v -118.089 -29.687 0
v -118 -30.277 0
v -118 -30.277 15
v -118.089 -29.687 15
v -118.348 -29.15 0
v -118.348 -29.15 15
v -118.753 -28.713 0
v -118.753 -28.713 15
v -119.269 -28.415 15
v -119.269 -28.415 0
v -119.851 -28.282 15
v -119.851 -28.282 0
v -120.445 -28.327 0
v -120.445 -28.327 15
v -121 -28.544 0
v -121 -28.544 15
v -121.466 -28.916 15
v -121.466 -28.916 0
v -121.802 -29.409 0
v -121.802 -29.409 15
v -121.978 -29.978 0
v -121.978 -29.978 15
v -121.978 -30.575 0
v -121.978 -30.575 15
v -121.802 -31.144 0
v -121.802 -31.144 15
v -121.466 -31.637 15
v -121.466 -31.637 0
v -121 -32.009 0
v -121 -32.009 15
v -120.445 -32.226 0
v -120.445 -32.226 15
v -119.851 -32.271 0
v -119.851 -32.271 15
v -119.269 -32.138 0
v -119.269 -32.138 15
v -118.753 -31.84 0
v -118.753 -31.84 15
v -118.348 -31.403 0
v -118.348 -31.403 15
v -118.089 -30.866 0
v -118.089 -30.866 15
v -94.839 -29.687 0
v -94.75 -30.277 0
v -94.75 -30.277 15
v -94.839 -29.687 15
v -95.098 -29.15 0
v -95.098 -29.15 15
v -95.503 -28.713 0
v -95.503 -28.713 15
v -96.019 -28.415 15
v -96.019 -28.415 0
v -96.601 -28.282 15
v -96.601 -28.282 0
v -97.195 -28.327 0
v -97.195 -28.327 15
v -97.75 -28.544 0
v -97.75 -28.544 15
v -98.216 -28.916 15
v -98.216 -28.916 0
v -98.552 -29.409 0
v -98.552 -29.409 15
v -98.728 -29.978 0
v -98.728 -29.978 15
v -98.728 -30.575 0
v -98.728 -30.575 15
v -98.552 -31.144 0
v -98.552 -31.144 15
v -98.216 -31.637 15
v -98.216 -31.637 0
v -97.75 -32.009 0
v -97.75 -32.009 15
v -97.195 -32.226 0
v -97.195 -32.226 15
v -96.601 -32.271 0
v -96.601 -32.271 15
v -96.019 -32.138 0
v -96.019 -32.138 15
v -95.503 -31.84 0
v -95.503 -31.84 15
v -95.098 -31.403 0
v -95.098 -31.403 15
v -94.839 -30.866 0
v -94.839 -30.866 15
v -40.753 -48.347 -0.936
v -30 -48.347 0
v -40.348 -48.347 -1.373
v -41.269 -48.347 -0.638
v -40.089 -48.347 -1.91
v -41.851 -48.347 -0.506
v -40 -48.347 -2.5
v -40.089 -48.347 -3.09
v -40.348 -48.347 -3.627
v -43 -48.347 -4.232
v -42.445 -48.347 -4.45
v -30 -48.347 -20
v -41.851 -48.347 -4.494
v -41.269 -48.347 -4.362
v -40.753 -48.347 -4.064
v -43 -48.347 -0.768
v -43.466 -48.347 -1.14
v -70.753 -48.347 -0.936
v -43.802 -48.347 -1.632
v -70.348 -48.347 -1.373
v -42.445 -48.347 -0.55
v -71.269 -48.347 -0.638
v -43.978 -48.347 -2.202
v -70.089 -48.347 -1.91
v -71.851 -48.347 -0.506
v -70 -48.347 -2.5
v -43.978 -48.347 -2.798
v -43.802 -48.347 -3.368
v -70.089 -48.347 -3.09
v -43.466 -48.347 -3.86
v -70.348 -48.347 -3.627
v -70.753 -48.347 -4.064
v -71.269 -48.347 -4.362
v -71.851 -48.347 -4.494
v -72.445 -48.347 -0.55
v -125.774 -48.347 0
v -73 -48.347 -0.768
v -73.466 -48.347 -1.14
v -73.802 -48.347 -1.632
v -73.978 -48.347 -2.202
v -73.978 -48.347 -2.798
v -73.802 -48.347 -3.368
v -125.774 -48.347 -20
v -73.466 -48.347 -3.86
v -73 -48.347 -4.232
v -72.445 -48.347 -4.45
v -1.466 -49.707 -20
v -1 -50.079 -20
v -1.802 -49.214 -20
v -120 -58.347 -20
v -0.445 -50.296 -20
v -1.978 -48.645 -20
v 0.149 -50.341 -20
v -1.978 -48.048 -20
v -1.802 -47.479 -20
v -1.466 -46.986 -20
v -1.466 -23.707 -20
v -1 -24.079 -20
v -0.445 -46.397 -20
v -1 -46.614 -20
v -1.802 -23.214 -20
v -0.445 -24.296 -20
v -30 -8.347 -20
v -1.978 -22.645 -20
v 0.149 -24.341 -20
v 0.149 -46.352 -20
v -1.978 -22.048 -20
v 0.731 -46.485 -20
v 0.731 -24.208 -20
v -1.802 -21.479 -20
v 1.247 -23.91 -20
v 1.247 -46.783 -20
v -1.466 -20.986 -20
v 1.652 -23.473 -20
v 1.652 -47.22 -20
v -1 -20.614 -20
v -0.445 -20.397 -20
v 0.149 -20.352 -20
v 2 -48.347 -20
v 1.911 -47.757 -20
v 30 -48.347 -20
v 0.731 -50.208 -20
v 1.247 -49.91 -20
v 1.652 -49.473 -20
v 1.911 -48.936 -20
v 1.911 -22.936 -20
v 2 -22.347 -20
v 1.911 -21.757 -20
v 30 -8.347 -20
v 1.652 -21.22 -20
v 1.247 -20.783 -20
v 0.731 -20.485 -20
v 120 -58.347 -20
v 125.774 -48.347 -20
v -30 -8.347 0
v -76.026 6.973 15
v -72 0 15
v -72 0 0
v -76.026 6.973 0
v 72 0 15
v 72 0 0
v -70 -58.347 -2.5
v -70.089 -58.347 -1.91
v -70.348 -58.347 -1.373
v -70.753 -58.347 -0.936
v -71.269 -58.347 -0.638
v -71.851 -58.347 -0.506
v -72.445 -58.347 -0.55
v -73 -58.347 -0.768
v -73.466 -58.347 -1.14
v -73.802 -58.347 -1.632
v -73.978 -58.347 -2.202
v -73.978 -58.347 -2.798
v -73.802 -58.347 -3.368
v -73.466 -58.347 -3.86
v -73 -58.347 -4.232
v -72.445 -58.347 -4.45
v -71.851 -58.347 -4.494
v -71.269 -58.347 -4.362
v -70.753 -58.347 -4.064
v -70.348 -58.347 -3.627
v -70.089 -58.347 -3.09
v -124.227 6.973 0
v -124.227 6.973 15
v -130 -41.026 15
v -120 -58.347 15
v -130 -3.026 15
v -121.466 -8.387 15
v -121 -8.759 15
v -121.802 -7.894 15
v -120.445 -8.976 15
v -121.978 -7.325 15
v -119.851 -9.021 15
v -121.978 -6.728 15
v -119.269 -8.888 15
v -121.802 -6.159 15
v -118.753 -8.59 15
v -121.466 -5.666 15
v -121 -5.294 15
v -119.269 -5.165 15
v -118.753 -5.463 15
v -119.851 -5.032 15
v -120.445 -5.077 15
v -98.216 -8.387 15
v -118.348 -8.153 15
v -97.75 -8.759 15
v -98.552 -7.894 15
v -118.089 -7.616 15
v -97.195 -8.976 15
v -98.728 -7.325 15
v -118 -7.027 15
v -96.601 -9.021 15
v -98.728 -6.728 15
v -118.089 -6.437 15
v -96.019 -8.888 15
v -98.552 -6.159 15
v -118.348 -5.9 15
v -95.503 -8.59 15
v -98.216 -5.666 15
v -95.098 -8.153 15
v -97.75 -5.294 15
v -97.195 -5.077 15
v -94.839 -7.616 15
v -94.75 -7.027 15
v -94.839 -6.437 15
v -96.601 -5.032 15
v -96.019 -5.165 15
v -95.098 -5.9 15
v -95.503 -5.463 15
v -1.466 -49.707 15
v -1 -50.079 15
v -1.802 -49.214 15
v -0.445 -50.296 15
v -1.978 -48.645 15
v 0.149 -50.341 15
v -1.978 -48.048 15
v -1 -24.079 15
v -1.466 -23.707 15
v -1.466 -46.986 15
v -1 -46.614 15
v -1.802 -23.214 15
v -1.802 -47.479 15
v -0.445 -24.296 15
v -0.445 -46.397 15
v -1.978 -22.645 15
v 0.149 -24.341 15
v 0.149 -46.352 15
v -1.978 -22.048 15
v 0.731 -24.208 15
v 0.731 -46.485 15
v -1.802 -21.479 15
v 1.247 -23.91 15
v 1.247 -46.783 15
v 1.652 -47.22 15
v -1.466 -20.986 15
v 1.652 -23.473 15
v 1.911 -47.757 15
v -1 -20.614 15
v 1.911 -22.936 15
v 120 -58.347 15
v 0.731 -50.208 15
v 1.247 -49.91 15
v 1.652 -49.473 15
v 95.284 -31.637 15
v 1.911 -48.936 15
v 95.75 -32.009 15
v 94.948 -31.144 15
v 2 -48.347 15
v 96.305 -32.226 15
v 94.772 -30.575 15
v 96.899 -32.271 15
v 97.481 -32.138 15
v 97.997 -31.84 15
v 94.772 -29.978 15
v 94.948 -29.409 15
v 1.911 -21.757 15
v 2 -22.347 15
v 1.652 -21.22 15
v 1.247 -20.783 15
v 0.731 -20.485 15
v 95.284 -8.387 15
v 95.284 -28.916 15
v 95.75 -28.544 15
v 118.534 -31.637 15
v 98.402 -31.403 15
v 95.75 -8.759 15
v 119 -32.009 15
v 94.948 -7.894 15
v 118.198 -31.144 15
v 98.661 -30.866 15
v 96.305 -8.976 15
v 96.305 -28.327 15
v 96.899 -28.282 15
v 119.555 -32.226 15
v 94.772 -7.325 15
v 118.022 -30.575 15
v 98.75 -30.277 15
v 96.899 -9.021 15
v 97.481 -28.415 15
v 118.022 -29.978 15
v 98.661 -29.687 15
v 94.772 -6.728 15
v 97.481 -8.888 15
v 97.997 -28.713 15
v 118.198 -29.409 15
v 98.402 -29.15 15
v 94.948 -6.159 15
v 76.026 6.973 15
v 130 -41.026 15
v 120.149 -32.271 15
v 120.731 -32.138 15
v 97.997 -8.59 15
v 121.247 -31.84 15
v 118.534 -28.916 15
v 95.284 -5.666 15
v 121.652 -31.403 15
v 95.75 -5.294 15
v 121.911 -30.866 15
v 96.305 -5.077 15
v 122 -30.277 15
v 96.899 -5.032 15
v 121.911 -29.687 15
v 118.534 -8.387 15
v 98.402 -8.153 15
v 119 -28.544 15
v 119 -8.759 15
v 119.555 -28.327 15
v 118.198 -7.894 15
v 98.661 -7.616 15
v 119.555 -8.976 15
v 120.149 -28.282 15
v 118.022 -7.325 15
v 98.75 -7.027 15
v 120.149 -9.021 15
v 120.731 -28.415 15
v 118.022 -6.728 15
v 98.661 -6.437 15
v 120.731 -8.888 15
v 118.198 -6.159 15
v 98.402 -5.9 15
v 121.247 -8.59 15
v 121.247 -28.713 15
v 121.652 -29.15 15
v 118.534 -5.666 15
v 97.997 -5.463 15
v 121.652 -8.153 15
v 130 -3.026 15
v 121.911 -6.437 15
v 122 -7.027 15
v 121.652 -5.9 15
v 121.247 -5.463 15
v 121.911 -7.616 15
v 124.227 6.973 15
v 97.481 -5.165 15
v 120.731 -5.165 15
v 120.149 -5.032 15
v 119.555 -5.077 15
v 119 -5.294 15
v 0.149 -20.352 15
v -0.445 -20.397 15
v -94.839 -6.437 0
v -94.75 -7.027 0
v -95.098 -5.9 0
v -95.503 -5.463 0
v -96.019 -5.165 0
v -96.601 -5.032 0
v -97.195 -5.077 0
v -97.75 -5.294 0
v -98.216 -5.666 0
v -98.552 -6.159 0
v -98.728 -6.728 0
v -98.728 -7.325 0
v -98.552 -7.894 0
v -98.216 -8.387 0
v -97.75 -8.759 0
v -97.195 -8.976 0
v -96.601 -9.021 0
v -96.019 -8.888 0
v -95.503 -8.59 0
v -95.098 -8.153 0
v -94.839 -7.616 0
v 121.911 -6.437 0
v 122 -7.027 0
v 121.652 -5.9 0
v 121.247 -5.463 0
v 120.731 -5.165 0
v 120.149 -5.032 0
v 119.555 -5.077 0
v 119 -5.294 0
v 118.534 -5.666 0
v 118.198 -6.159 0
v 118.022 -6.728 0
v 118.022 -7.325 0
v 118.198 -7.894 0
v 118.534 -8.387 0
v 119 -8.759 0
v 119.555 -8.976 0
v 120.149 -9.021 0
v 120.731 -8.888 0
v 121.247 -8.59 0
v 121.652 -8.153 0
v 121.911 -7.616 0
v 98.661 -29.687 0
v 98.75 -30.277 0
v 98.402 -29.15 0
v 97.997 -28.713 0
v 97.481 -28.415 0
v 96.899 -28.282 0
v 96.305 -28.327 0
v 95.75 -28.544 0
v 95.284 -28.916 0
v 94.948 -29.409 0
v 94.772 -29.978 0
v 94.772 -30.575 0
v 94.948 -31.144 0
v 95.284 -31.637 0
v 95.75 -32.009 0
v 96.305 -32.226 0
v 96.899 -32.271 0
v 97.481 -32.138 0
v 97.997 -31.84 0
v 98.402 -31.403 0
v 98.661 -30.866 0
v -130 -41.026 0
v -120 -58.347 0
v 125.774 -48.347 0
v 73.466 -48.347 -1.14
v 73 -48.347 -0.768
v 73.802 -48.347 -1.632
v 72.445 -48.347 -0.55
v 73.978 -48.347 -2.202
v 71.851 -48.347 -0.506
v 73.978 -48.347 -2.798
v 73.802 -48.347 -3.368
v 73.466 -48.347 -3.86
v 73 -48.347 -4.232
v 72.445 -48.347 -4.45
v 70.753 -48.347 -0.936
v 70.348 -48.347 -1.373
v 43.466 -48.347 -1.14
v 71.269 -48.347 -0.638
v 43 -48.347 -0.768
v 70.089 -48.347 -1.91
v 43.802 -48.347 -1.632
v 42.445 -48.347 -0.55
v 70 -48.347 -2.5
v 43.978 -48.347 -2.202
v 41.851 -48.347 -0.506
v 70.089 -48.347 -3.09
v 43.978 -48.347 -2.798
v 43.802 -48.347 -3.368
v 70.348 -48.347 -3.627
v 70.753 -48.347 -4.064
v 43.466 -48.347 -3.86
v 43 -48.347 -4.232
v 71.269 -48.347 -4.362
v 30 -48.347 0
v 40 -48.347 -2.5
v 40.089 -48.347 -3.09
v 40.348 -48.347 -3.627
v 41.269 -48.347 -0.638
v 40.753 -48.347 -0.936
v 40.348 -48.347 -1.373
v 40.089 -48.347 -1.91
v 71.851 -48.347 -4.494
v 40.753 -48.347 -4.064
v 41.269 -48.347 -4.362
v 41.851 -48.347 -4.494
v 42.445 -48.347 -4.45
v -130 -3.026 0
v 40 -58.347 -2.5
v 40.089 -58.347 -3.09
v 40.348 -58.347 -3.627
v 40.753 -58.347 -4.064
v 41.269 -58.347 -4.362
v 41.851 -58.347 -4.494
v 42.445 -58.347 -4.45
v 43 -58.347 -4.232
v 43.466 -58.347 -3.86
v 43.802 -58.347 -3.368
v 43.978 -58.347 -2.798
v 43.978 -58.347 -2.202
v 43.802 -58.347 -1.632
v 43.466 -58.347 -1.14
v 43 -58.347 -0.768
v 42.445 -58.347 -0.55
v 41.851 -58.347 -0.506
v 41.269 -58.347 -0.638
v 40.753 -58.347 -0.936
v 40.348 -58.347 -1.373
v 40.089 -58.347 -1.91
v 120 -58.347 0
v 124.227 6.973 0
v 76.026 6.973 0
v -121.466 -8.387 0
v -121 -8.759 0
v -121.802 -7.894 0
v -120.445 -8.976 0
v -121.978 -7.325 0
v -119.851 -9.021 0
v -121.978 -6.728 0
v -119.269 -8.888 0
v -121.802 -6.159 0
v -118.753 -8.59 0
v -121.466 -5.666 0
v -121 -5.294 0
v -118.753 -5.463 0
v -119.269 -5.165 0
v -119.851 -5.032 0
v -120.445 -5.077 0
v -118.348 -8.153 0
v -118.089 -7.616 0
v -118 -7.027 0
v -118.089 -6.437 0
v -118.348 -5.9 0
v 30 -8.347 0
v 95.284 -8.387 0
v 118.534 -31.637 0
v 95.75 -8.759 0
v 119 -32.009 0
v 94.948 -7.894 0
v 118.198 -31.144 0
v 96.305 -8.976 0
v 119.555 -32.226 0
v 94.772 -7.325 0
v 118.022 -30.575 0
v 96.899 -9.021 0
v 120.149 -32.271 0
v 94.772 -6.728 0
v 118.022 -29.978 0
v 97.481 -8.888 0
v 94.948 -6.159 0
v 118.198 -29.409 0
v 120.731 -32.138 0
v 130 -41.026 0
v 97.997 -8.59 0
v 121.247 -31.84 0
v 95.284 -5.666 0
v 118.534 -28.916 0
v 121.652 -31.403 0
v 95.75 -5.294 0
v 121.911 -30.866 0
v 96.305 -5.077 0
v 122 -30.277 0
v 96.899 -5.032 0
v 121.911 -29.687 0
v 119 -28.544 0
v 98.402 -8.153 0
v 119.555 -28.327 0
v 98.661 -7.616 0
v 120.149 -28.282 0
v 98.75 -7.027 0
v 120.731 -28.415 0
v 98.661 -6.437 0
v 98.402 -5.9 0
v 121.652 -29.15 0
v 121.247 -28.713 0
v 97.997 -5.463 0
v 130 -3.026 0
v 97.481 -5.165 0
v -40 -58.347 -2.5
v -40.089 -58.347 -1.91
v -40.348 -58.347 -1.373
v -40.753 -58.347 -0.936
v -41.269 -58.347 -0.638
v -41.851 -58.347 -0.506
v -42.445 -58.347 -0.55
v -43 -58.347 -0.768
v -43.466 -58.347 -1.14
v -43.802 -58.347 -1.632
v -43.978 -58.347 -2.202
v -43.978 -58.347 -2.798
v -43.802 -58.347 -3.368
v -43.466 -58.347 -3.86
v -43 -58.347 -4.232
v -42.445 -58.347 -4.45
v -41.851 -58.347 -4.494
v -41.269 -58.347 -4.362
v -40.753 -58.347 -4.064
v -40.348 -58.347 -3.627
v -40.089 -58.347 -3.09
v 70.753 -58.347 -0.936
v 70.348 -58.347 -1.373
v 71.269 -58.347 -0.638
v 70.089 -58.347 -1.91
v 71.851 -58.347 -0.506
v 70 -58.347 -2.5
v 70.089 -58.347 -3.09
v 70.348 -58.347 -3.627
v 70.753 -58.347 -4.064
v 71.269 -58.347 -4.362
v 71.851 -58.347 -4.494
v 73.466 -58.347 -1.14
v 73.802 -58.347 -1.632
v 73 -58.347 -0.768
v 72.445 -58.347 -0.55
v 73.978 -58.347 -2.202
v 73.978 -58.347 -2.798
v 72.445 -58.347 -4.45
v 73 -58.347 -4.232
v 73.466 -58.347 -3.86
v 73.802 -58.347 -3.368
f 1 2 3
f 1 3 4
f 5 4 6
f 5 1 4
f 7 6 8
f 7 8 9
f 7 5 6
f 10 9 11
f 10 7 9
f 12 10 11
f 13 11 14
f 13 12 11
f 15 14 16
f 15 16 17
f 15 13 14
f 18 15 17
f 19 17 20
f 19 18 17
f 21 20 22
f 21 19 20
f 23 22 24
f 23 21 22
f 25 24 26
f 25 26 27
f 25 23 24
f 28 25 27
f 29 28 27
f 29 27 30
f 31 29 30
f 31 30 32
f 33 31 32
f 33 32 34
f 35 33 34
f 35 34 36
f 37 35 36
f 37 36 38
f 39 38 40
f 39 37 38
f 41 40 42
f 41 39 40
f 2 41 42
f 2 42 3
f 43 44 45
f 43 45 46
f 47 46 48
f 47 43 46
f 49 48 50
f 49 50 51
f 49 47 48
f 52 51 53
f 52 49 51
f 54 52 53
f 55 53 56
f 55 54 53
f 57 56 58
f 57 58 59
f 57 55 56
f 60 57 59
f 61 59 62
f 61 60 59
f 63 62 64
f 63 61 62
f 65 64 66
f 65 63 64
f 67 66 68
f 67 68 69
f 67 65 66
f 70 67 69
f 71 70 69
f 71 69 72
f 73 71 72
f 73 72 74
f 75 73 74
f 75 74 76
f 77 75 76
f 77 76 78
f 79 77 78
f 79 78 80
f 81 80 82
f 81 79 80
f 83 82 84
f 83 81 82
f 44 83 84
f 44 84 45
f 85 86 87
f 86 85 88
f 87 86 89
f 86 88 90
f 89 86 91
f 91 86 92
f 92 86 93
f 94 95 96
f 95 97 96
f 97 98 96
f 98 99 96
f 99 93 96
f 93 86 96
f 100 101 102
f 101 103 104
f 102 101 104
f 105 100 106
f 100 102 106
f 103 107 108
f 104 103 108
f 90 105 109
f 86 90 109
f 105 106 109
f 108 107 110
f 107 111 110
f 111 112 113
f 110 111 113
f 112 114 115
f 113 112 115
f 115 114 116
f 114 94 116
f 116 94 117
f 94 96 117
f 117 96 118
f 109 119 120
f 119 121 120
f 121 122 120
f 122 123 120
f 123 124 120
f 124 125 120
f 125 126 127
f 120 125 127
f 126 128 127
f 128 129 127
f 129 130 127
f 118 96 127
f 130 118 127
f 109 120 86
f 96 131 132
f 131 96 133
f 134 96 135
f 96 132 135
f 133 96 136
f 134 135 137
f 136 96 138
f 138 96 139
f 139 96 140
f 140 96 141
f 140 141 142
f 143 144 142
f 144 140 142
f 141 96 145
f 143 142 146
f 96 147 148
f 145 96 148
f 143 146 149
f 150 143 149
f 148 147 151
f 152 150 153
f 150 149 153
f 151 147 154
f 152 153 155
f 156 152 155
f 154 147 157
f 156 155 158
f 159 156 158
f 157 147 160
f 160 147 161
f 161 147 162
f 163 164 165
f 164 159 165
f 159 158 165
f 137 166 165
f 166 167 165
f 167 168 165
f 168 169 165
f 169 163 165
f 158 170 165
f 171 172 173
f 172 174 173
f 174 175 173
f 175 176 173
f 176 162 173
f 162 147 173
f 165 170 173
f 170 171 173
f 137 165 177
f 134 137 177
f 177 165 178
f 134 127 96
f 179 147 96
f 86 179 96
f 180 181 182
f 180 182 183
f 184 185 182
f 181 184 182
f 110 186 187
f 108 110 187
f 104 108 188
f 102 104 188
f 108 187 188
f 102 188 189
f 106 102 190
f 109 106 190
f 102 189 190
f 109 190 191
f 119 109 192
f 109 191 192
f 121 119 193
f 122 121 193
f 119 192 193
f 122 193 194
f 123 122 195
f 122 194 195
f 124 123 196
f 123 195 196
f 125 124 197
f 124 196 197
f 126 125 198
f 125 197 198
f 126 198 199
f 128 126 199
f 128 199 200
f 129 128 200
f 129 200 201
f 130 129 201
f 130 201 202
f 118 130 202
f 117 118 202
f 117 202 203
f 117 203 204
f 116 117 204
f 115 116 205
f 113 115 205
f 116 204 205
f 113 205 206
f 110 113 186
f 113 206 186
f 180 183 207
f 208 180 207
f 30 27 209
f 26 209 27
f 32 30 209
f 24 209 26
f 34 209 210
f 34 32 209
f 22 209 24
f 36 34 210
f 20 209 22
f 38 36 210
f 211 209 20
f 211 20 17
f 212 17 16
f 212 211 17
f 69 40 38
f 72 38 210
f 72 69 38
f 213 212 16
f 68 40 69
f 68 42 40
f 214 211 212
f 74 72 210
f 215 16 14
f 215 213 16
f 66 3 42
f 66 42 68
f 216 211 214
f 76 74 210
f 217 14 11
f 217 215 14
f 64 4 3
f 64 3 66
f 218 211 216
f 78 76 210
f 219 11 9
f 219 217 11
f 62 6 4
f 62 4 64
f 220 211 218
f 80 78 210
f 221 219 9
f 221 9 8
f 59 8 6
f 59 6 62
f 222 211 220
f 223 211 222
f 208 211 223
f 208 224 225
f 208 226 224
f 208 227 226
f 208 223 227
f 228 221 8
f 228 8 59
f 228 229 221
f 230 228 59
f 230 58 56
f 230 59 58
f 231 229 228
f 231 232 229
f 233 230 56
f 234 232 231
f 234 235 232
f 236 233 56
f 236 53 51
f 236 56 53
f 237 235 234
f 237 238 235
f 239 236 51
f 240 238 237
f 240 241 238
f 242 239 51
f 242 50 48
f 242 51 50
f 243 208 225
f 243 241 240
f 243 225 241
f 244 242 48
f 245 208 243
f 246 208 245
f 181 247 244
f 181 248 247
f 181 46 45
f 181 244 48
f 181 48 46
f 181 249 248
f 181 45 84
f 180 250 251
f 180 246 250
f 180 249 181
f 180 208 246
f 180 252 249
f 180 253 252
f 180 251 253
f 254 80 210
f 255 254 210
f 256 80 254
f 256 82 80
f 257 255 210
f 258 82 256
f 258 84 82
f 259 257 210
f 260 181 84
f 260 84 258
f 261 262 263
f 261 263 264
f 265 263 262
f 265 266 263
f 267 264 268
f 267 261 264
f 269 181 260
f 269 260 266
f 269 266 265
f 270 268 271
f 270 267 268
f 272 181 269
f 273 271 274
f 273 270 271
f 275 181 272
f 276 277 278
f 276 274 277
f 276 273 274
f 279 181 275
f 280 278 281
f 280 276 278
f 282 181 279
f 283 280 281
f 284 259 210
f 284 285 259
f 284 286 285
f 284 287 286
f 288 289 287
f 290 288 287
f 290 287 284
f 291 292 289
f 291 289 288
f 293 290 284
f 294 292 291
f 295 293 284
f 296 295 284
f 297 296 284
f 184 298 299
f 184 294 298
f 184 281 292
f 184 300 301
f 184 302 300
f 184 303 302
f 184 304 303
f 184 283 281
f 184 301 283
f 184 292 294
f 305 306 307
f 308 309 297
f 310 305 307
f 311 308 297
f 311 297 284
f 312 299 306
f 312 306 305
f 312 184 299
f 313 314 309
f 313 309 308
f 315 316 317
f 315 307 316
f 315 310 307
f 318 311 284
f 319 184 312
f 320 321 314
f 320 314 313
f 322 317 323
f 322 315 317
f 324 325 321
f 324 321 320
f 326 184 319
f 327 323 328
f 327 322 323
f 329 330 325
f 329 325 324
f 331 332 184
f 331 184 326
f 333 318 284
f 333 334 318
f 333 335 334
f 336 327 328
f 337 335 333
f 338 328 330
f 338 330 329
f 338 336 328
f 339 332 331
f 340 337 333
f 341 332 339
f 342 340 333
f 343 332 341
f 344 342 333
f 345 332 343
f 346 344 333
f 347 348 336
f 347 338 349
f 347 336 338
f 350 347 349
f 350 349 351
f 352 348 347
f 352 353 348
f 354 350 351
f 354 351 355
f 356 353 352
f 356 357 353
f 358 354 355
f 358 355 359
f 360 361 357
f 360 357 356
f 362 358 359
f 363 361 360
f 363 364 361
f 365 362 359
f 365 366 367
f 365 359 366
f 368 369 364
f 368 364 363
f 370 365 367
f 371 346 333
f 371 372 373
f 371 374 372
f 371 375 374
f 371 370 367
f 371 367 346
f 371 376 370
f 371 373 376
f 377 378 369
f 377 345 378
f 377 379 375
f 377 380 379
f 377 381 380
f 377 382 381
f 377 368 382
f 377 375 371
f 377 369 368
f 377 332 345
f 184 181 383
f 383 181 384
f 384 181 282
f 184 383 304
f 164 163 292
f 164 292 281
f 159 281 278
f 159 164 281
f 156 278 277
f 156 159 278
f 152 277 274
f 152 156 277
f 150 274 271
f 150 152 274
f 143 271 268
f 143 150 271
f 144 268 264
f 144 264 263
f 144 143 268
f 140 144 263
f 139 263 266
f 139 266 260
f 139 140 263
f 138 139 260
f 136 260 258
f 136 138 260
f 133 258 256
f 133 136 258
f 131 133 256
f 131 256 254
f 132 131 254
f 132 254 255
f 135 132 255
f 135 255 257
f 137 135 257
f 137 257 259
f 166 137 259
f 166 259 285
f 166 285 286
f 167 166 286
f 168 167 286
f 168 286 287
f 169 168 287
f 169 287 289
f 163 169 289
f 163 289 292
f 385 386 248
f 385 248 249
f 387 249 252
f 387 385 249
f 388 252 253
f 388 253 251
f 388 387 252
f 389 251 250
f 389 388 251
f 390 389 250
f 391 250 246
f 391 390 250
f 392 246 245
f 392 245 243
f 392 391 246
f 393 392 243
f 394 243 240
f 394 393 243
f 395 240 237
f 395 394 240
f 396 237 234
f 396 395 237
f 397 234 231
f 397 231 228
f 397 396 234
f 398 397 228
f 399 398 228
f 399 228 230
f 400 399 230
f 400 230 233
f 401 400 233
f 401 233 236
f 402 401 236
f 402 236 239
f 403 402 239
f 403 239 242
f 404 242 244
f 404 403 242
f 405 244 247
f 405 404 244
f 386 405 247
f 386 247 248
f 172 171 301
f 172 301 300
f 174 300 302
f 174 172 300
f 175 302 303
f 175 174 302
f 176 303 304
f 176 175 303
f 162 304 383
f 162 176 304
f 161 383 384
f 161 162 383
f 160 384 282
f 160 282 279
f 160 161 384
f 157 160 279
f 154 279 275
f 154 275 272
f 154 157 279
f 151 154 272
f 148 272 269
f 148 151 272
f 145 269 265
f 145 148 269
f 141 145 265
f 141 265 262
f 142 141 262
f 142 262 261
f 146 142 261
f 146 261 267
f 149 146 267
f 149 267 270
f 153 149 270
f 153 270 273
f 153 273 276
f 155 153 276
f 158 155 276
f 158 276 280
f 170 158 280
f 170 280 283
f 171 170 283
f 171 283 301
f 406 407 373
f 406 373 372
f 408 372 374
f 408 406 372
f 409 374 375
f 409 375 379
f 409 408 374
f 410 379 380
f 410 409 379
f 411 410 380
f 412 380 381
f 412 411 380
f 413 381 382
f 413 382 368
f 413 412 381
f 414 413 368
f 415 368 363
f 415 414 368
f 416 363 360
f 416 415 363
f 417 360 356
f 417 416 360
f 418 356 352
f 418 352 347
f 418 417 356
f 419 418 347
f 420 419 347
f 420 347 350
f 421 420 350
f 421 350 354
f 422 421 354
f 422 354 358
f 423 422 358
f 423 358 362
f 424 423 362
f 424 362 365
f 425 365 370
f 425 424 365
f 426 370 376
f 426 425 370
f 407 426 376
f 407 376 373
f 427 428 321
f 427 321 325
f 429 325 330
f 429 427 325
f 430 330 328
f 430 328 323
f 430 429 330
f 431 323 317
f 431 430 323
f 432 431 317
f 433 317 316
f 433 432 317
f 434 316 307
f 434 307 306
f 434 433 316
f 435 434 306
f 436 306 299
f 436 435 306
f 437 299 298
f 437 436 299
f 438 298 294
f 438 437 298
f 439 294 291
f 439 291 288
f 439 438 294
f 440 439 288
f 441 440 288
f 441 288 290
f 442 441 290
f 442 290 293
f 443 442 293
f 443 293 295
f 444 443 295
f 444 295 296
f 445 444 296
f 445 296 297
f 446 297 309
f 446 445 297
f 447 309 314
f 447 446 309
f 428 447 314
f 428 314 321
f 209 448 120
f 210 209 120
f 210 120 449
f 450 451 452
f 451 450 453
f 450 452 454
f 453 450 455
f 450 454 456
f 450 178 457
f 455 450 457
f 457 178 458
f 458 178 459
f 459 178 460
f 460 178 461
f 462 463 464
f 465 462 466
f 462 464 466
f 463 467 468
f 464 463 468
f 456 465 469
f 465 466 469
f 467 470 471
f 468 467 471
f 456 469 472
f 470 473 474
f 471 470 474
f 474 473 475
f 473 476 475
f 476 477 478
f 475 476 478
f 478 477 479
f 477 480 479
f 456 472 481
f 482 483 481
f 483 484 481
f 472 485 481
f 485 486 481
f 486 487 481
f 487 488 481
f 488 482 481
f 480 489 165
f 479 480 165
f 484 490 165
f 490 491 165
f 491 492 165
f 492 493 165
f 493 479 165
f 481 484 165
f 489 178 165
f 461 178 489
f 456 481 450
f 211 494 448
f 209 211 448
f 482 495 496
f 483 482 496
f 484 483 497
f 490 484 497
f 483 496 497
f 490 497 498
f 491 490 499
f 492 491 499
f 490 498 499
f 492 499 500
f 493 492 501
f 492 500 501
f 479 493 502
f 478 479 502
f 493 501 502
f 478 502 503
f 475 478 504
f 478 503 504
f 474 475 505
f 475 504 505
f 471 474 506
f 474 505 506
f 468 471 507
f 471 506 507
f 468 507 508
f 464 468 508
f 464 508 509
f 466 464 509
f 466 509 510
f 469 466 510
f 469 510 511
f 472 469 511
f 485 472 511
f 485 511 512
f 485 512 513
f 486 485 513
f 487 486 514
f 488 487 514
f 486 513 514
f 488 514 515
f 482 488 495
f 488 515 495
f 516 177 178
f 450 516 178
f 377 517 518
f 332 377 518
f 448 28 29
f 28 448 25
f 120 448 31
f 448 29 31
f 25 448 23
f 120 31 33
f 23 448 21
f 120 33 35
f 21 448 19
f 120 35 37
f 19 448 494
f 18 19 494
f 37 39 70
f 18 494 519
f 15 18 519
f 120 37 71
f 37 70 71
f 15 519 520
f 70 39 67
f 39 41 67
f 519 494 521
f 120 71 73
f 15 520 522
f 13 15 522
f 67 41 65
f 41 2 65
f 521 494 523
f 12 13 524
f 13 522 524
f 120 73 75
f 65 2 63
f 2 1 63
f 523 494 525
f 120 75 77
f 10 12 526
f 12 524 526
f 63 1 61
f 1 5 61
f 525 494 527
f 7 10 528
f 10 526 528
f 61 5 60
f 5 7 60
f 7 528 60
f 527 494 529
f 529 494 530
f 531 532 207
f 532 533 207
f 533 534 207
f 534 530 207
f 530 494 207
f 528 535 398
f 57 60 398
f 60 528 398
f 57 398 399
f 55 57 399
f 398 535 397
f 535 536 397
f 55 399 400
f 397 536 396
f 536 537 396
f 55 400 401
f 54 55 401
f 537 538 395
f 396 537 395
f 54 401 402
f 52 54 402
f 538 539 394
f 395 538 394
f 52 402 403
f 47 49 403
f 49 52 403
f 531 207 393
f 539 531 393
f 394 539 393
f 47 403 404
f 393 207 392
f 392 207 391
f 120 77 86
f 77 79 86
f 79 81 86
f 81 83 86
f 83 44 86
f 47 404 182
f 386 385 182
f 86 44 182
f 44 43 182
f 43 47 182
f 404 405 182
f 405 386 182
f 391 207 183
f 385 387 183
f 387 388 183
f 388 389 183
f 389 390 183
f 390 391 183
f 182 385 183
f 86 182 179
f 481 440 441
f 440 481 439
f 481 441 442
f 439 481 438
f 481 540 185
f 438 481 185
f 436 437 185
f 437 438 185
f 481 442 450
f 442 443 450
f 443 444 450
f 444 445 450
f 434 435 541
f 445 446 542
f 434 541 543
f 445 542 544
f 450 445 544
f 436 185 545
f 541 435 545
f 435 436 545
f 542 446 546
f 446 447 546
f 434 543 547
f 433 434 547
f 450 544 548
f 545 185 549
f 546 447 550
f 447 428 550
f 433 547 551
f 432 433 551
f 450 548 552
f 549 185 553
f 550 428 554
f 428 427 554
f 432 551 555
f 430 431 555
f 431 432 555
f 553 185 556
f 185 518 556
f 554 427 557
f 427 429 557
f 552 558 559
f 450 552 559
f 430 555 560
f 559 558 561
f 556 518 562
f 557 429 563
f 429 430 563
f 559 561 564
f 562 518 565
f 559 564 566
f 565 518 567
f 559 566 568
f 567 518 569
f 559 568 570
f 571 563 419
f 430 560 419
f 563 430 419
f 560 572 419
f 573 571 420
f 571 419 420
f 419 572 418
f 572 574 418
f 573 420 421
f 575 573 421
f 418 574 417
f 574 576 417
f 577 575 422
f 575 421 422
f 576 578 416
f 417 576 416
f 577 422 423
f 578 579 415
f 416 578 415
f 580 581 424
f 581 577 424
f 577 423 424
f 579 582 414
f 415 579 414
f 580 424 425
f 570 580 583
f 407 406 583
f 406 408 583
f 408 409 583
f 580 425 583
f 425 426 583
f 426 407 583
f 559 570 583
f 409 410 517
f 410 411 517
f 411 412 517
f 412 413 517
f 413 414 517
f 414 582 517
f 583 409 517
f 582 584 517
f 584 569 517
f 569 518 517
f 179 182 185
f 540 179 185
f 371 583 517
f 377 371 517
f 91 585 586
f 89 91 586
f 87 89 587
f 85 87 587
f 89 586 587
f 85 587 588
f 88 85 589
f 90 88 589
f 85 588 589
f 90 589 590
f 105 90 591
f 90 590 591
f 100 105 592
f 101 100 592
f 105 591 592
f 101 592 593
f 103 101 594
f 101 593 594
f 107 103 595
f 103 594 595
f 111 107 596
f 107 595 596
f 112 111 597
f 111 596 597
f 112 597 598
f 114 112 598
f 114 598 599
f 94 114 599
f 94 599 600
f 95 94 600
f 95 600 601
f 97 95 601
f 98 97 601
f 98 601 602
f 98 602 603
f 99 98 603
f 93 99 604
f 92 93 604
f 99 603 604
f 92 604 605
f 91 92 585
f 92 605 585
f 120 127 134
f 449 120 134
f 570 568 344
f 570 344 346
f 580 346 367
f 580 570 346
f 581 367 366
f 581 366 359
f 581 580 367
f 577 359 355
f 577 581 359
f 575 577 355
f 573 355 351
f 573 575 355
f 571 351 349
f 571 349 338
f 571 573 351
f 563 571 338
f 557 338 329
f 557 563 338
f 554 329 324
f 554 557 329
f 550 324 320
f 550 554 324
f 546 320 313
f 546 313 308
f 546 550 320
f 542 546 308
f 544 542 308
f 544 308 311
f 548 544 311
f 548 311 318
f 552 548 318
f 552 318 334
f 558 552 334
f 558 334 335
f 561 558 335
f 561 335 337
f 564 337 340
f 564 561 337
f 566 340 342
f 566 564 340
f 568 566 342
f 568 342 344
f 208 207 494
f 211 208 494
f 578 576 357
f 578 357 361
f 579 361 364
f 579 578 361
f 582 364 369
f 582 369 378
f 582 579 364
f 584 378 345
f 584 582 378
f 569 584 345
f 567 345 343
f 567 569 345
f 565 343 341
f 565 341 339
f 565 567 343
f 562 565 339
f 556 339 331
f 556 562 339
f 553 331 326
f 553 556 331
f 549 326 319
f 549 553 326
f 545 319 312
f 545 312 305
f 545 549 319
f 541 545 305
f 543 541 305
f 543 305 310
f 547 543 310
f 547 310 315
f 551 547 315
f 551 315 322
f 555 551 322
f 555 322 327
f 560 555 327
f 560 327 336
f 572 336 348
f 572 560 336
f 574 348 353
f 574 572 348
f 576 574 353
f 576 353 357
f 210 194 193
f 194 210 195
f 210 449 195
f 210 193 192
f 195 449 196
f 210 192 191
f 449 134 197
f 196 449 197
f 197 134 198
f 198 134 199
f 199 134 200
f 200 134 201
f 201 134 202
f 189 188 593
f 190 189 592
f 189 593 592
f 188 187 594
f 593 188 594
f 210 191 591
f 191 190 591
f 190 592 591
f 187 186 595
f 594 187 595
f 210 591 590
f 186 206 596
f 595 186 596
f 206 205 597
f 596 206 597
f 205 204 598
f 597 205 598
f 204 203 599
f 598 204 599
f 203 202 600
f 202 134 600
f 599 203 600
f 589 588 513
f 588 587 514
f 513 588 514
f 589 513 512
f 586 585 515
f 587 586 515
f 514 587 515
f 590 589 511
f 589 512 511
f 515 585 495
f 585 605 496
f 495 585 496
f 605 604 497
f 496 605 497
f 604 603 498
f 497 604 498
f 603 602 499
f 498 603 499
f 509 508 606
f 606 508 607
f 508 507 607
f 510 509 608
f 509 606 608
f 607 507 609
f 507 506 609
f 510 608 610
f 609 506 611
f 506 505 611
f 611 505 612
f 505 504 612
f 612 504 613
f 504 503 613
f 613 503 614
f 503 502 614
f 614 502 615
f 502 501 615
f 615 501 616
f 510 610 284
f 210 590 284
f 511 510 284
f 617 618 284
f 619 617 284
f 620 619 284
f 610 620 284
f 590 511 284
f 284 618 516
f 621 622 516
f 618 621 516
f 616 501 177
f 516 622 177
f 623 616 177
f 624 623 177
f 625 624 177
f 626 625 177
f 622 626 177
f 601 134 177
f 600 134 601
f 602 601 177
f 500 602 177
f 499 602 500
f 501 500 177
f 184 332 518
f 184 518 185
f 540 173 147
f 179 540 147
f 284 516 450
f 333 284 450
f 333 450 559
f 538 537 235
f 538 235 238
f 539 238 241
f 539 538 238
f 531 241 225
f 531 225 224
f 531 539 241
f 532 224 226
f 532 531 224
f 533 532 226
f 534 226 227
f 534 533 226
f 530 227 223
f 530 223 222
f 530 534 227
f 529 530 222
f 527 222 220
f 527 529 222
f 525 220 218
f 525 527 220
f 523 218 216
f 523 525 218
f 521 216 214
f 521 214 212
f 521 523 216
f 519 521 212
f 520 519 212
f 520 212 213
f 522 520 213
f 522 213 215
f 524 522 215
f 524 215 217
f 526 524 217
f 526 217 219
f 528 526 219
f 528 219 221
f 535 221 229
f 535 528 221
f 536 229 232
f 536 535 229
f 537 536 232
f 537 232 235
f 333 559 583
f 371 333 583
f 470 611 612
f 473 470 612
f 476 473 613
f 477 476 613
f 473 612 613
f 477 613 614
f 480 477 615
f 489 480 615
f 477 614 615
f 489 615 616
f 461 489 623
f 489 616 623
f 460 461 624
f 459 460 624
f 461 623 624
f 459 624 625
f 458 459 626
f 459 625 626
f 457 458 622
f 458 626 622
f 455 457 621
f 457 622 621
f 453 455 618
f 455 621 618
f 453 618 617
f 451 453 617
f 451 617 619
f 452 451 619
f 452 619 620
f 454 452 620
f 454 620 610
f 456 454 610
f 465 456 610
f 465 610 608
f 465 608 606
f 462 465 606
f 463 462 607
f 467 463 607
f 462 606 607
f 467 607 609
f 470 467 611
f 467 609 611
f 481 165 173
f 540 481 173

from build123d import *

# Parameters (mm, degrees)
SKETCH1_R           = 2
BOSS_EXTRUDE1_DEPTH = 15
BOSS_EXTRUDE2_START = -35
SKETCH2_R           = 2
BOSS_EXTRUDE2_DEPTH = 35
SKETCH4_R           = 2
CUT_EXTRUDE1_DEPTH  = 10


with BuildPart() as part:
    # Sketch1 → Boss-Extrude1 (new body)
    with BuildSketch(Plane.XY):
        Polygon((130, -41.026010691), (130, -3.026010691), (124.226790646, 6.973481233), (76.026141267, 6.973481233), (72, 0), (-72, 0), (-76.026141267, 6.973481233), (-124.226790646, 6.973481233), (-130, -3.026010691), (-130, -41.026010691), (-120, -58.346518767), (120, -58.346518767), align=None)
        with Locations((-120, -7.026518767)):
            Circle(SKETCH1_R, mode=Mode.SUBTRACT)
        with Locations((-96.75, -7.026518767)):
            Circle(SKETCH1_R, mode=Mode.SUBTRACT)
        with Locations((-96.75, -30.276518767)):
            Circle(SKETCH1_R, mode=Mode.SUBTRACT)
        with Locations((-120, -30.276518767)):
            Circle(SKETCH1_R, mode=Mode.SUBTRACT)
        with Locations((120, -7.026518767)):
            Circle(SKETCH1_R, mode=Mode.SUBTRACT)
        with Locations((120, -30.276518767)):
            Circle(SKETCH1_R, mode=Mode.SUBTRACT)
        with Locations((96.75, -7.026518767)):
            Circle(SKETCH1_R, mode=Mode.SUBTRACT)
        with Locations((96.75, -30.276518767)):
            Circle(SKETCH1_R, mode=Mode.SUBTRACT)
        with Locations((0, -48.346518767)):
            Circle(SKETCH1_R, mode=Mode.SUBTRACT)
        with Locations((0, -22.346518767)):
            Circle(SKETCH1_R, mode=Mode.SUBTRACT)
    extrude(amount=BOSS_EXTRUDE1_DEPTH)

    # Sketch2 → Boss-Extrude2 (add)
    with BuildSketch(Plane.XY.offset(15).offset(BOSS_EXTRUDE2_START)):
        Polygon((-125.773502692, -48.346518767), (-120, -58.346518767), (120, -58.346518767), (125.773502692, -48.346518767), (30, -48.346518767), (30, -8.346518767), (-30, -8.346518767), (-30, -48.346518767), align=None)
        with Locations((0, -48.346518767)):
            Circle(SKETCH2_R, mode=Mode.SUBTRACT)
        with Locations((0, -22.346518767)):
            Circle(SKETCH2_R, mode=Mode.SUBTRACT)
    extrude(amount=BOSS_EXTRUDE2_DEPTH)

    # Sketch4 → Cut-Extrude1 (cut)
    with BuildSketch(Plane.XZ.offset(58.346518767)):
        with Locations((-72, -2.5)):
            Circle(SKETCH4_R)
        with Locations((-42, -2.5)):
            Circle(SKETCH4_R)
        with Locations(Location((42, -2.5, 0), (0, 0, 180))):
            Circle(SKETCH4_R)
        with Locations(Location((72, -2.5, 0), (0, 0, 180))):
            Circle(SKETCH4_R)
    extrude(amount=-CUT_EXTRUDE1_DEPTH, mode=Mode.SUBTRACT)


solid = part.part
